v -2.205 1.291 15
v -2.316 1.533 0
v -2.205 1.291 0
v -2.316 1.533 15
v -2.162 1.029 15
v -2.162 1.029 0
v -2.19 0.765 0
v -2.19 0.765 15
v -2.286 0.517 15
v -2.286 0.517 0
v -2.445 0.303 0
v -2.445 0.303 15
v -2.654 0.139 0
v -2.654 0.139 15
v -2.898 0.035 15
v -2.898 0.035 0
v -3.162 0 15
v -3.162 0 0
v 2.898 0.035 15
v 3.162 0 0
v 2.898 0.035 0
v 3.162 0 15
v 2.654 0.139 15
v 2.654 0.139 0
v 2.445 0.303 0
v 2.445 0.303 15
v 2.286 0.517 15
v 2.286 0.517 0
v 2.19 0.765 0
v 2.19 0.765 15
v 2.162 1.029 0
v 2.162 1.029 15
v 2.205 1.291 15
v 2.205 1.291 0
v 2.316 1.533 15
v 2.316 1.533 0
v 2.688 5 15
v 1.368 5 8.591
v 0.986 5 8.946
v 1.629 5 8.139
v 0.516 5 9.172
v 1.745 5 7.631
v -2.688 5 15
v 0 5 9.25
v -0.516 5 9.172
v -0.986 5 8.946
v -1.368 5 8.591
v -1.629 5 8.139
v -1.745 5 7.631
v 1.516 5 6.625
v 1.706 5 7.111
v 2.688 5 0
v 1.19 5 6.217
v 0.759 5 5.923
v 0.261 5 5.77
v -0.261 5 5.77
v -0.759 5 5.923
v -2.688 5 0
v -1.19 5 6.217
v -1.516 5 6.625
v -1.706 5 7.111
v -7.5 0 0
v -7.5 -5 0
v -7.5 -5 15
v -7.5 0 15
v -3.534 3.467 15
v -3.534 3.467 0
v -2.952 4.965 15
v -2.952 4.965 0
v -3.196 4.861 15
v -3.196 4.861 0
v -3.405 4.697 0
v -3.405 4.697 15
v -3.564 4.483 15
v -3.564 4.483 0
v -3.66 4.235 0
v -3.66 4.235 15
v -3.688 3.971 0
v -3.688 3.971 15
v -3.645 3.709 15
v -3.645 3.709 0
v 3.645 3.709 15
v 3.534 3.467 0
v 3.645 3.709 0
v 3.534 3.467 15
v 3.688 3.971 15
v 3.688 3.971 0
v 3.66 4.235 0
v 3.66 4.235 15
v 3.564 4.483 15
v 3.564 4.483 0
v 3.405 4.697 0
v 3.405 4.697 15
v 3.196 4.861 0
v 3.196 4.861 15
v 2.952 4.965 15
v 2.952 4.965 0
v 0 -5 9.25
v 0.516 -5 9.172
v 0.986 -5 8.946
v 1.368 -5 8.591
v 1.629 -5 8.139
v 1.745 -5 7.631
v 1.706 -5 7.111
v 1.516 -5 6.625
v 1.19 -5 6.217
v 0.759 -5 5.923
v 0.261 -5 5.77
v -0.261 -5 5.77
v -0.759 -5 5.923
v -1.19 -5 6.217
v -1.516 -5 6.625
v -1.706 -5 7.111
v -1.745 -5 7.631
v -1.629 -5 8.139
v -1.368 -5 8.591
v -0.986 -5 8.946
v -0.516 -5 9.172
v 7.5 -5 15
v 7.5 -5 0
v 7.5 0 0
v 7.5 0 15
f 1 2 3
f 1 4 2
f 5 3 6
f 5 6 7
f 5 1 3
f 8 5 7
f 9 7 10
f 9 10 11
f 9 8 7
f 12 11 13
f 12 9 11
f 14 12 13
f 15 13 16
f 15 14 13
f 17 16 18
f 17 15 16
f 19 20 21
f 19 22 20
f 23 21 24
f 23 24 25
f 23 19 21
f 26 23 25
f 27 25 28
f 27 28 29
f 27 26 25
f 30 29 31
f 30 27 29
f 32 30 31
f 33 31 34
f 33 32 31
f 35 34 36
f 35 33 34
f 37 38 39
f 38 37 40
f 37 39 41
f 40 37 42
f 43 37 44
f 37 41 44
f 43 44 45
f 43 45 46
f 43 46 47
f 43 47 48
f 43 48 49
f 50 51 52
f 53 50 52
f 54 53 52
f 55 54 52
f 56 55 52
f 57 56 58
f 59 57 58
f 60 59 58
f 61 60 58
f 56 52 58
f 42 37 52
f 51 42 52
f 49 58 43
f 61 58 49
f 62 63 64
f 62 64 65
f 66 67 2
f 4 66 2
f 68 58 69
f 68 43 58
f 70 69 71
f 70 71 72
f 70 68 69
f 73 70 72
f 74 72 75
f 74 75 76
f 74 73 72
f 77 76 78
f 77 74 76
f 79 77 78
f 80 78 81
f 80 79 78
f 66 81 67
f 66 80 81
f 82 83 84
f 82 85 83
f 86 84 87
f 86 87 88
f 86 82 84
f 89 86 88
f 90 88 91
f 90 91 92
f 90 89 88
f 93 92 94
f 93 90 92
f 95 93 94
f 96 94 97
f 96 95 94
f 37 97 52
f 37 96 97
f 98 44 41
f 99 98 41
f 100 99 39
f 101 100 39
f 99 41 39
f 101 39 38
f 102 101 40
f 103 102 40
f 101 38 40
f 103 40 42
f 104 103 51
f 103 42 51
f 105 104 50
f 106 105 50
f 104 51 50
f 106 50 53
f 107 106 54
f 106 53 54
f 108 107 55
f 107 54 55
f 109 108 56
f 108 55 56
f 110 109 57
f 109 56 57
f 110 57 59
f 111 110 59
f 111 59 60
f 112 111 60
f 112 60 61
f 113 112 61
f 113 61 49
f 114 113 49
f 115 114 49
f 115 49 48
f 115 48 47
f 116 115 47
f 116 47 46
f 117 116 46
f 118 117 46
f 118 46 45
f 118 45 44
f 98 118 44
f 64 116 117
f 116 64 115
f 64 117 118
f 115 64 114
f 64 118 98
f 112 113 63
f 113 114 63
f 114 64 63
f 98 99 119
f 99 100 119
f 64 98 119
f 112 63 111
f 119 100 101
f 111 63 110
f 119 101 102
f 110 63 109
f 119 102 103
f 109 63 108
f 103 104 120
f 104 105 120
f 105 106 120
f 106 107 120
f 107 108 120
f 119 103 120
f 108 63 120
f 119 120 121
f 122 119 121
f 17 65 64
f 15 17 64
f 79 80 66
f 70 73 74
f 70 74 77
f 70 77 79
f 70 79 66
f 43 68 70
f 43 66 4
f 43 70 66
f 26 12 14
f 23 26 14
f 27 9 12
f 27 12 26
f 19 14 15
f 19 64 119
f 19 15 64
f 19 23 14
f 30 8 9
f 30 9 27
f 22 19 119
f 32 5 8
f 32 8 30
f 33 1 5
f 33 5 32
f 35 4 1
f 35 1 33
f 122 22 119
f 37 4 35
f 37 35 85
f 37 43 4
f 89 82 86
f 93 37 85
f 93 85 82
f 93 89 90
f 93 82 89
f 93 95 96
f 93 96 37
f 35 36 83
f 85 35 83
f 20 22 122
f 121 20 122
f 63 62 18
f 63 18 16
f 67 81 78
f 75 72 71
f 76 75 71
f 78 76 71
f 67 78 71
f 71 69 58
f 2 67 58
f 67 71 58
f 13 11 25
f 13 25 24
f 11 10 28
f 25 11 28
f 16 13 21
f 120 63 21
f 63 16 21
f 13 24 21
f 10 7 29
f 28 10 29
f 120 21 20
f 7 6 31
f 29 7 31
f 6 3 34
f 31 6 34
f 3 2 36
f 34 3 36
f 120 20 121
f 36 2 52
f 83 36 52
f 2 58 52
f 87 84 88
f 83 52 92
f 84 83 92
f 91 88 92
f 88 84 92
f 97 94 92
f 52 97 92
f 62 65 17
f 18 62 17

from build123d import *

# Parameters (mm, degrees)
ESBO_O1_W                = 15
ESBO_O1_H                = 5
RESSALTO_EXTRUS_O1_DEPTH = 15
FILETE1_R                = 1
ESBO_O2_R                = 1.75
CORTE_EXTRUS_O1_DEPTH    = 15


with BuildPart() as part:
    # Esboço1 → Ressalto-extrusão1 (new body)
    with BuildSketch(Plane.XY):
        with Locations((0, -2.5)):
            Rectangle(ESBO_O1_W, ESBO_O1_H)
        Polygon((-4.5, 5), (-1.35, 0), (1.35, 0), (4.5, 5), align=None)
    extrude(amount=RESSALTO_EXTRUS_O1_DEPTH)

    # Filete1
    filete1_edges = [part.edges().sort_by_distance(p)[0] for p in [
        (-1.35, 0, 7.5),
        (-4.5, 5, 7.5),
        (4.5, 5, 7.5),
        (1.35, 0, 7.5),
    ]]
    fillet(filete1_edges, radius=FILETE1_R)

    # Esboço2 → Corte-extrusão1 (cut)
    with BuildSketch(Plane(origin=(0, 5, 0), x_dir=(1, 0, 0), z_dir=(0, 1, 0))):
        with Locations(Location((0, -7.5, 0), (0, 0, 270))):
            Circle(ESBO_O2_R)
    extrude(amount=-CORTE_EXTRUS_O1_DEPTH, mode=Mode.SUBTRACT)


solid = part.part
